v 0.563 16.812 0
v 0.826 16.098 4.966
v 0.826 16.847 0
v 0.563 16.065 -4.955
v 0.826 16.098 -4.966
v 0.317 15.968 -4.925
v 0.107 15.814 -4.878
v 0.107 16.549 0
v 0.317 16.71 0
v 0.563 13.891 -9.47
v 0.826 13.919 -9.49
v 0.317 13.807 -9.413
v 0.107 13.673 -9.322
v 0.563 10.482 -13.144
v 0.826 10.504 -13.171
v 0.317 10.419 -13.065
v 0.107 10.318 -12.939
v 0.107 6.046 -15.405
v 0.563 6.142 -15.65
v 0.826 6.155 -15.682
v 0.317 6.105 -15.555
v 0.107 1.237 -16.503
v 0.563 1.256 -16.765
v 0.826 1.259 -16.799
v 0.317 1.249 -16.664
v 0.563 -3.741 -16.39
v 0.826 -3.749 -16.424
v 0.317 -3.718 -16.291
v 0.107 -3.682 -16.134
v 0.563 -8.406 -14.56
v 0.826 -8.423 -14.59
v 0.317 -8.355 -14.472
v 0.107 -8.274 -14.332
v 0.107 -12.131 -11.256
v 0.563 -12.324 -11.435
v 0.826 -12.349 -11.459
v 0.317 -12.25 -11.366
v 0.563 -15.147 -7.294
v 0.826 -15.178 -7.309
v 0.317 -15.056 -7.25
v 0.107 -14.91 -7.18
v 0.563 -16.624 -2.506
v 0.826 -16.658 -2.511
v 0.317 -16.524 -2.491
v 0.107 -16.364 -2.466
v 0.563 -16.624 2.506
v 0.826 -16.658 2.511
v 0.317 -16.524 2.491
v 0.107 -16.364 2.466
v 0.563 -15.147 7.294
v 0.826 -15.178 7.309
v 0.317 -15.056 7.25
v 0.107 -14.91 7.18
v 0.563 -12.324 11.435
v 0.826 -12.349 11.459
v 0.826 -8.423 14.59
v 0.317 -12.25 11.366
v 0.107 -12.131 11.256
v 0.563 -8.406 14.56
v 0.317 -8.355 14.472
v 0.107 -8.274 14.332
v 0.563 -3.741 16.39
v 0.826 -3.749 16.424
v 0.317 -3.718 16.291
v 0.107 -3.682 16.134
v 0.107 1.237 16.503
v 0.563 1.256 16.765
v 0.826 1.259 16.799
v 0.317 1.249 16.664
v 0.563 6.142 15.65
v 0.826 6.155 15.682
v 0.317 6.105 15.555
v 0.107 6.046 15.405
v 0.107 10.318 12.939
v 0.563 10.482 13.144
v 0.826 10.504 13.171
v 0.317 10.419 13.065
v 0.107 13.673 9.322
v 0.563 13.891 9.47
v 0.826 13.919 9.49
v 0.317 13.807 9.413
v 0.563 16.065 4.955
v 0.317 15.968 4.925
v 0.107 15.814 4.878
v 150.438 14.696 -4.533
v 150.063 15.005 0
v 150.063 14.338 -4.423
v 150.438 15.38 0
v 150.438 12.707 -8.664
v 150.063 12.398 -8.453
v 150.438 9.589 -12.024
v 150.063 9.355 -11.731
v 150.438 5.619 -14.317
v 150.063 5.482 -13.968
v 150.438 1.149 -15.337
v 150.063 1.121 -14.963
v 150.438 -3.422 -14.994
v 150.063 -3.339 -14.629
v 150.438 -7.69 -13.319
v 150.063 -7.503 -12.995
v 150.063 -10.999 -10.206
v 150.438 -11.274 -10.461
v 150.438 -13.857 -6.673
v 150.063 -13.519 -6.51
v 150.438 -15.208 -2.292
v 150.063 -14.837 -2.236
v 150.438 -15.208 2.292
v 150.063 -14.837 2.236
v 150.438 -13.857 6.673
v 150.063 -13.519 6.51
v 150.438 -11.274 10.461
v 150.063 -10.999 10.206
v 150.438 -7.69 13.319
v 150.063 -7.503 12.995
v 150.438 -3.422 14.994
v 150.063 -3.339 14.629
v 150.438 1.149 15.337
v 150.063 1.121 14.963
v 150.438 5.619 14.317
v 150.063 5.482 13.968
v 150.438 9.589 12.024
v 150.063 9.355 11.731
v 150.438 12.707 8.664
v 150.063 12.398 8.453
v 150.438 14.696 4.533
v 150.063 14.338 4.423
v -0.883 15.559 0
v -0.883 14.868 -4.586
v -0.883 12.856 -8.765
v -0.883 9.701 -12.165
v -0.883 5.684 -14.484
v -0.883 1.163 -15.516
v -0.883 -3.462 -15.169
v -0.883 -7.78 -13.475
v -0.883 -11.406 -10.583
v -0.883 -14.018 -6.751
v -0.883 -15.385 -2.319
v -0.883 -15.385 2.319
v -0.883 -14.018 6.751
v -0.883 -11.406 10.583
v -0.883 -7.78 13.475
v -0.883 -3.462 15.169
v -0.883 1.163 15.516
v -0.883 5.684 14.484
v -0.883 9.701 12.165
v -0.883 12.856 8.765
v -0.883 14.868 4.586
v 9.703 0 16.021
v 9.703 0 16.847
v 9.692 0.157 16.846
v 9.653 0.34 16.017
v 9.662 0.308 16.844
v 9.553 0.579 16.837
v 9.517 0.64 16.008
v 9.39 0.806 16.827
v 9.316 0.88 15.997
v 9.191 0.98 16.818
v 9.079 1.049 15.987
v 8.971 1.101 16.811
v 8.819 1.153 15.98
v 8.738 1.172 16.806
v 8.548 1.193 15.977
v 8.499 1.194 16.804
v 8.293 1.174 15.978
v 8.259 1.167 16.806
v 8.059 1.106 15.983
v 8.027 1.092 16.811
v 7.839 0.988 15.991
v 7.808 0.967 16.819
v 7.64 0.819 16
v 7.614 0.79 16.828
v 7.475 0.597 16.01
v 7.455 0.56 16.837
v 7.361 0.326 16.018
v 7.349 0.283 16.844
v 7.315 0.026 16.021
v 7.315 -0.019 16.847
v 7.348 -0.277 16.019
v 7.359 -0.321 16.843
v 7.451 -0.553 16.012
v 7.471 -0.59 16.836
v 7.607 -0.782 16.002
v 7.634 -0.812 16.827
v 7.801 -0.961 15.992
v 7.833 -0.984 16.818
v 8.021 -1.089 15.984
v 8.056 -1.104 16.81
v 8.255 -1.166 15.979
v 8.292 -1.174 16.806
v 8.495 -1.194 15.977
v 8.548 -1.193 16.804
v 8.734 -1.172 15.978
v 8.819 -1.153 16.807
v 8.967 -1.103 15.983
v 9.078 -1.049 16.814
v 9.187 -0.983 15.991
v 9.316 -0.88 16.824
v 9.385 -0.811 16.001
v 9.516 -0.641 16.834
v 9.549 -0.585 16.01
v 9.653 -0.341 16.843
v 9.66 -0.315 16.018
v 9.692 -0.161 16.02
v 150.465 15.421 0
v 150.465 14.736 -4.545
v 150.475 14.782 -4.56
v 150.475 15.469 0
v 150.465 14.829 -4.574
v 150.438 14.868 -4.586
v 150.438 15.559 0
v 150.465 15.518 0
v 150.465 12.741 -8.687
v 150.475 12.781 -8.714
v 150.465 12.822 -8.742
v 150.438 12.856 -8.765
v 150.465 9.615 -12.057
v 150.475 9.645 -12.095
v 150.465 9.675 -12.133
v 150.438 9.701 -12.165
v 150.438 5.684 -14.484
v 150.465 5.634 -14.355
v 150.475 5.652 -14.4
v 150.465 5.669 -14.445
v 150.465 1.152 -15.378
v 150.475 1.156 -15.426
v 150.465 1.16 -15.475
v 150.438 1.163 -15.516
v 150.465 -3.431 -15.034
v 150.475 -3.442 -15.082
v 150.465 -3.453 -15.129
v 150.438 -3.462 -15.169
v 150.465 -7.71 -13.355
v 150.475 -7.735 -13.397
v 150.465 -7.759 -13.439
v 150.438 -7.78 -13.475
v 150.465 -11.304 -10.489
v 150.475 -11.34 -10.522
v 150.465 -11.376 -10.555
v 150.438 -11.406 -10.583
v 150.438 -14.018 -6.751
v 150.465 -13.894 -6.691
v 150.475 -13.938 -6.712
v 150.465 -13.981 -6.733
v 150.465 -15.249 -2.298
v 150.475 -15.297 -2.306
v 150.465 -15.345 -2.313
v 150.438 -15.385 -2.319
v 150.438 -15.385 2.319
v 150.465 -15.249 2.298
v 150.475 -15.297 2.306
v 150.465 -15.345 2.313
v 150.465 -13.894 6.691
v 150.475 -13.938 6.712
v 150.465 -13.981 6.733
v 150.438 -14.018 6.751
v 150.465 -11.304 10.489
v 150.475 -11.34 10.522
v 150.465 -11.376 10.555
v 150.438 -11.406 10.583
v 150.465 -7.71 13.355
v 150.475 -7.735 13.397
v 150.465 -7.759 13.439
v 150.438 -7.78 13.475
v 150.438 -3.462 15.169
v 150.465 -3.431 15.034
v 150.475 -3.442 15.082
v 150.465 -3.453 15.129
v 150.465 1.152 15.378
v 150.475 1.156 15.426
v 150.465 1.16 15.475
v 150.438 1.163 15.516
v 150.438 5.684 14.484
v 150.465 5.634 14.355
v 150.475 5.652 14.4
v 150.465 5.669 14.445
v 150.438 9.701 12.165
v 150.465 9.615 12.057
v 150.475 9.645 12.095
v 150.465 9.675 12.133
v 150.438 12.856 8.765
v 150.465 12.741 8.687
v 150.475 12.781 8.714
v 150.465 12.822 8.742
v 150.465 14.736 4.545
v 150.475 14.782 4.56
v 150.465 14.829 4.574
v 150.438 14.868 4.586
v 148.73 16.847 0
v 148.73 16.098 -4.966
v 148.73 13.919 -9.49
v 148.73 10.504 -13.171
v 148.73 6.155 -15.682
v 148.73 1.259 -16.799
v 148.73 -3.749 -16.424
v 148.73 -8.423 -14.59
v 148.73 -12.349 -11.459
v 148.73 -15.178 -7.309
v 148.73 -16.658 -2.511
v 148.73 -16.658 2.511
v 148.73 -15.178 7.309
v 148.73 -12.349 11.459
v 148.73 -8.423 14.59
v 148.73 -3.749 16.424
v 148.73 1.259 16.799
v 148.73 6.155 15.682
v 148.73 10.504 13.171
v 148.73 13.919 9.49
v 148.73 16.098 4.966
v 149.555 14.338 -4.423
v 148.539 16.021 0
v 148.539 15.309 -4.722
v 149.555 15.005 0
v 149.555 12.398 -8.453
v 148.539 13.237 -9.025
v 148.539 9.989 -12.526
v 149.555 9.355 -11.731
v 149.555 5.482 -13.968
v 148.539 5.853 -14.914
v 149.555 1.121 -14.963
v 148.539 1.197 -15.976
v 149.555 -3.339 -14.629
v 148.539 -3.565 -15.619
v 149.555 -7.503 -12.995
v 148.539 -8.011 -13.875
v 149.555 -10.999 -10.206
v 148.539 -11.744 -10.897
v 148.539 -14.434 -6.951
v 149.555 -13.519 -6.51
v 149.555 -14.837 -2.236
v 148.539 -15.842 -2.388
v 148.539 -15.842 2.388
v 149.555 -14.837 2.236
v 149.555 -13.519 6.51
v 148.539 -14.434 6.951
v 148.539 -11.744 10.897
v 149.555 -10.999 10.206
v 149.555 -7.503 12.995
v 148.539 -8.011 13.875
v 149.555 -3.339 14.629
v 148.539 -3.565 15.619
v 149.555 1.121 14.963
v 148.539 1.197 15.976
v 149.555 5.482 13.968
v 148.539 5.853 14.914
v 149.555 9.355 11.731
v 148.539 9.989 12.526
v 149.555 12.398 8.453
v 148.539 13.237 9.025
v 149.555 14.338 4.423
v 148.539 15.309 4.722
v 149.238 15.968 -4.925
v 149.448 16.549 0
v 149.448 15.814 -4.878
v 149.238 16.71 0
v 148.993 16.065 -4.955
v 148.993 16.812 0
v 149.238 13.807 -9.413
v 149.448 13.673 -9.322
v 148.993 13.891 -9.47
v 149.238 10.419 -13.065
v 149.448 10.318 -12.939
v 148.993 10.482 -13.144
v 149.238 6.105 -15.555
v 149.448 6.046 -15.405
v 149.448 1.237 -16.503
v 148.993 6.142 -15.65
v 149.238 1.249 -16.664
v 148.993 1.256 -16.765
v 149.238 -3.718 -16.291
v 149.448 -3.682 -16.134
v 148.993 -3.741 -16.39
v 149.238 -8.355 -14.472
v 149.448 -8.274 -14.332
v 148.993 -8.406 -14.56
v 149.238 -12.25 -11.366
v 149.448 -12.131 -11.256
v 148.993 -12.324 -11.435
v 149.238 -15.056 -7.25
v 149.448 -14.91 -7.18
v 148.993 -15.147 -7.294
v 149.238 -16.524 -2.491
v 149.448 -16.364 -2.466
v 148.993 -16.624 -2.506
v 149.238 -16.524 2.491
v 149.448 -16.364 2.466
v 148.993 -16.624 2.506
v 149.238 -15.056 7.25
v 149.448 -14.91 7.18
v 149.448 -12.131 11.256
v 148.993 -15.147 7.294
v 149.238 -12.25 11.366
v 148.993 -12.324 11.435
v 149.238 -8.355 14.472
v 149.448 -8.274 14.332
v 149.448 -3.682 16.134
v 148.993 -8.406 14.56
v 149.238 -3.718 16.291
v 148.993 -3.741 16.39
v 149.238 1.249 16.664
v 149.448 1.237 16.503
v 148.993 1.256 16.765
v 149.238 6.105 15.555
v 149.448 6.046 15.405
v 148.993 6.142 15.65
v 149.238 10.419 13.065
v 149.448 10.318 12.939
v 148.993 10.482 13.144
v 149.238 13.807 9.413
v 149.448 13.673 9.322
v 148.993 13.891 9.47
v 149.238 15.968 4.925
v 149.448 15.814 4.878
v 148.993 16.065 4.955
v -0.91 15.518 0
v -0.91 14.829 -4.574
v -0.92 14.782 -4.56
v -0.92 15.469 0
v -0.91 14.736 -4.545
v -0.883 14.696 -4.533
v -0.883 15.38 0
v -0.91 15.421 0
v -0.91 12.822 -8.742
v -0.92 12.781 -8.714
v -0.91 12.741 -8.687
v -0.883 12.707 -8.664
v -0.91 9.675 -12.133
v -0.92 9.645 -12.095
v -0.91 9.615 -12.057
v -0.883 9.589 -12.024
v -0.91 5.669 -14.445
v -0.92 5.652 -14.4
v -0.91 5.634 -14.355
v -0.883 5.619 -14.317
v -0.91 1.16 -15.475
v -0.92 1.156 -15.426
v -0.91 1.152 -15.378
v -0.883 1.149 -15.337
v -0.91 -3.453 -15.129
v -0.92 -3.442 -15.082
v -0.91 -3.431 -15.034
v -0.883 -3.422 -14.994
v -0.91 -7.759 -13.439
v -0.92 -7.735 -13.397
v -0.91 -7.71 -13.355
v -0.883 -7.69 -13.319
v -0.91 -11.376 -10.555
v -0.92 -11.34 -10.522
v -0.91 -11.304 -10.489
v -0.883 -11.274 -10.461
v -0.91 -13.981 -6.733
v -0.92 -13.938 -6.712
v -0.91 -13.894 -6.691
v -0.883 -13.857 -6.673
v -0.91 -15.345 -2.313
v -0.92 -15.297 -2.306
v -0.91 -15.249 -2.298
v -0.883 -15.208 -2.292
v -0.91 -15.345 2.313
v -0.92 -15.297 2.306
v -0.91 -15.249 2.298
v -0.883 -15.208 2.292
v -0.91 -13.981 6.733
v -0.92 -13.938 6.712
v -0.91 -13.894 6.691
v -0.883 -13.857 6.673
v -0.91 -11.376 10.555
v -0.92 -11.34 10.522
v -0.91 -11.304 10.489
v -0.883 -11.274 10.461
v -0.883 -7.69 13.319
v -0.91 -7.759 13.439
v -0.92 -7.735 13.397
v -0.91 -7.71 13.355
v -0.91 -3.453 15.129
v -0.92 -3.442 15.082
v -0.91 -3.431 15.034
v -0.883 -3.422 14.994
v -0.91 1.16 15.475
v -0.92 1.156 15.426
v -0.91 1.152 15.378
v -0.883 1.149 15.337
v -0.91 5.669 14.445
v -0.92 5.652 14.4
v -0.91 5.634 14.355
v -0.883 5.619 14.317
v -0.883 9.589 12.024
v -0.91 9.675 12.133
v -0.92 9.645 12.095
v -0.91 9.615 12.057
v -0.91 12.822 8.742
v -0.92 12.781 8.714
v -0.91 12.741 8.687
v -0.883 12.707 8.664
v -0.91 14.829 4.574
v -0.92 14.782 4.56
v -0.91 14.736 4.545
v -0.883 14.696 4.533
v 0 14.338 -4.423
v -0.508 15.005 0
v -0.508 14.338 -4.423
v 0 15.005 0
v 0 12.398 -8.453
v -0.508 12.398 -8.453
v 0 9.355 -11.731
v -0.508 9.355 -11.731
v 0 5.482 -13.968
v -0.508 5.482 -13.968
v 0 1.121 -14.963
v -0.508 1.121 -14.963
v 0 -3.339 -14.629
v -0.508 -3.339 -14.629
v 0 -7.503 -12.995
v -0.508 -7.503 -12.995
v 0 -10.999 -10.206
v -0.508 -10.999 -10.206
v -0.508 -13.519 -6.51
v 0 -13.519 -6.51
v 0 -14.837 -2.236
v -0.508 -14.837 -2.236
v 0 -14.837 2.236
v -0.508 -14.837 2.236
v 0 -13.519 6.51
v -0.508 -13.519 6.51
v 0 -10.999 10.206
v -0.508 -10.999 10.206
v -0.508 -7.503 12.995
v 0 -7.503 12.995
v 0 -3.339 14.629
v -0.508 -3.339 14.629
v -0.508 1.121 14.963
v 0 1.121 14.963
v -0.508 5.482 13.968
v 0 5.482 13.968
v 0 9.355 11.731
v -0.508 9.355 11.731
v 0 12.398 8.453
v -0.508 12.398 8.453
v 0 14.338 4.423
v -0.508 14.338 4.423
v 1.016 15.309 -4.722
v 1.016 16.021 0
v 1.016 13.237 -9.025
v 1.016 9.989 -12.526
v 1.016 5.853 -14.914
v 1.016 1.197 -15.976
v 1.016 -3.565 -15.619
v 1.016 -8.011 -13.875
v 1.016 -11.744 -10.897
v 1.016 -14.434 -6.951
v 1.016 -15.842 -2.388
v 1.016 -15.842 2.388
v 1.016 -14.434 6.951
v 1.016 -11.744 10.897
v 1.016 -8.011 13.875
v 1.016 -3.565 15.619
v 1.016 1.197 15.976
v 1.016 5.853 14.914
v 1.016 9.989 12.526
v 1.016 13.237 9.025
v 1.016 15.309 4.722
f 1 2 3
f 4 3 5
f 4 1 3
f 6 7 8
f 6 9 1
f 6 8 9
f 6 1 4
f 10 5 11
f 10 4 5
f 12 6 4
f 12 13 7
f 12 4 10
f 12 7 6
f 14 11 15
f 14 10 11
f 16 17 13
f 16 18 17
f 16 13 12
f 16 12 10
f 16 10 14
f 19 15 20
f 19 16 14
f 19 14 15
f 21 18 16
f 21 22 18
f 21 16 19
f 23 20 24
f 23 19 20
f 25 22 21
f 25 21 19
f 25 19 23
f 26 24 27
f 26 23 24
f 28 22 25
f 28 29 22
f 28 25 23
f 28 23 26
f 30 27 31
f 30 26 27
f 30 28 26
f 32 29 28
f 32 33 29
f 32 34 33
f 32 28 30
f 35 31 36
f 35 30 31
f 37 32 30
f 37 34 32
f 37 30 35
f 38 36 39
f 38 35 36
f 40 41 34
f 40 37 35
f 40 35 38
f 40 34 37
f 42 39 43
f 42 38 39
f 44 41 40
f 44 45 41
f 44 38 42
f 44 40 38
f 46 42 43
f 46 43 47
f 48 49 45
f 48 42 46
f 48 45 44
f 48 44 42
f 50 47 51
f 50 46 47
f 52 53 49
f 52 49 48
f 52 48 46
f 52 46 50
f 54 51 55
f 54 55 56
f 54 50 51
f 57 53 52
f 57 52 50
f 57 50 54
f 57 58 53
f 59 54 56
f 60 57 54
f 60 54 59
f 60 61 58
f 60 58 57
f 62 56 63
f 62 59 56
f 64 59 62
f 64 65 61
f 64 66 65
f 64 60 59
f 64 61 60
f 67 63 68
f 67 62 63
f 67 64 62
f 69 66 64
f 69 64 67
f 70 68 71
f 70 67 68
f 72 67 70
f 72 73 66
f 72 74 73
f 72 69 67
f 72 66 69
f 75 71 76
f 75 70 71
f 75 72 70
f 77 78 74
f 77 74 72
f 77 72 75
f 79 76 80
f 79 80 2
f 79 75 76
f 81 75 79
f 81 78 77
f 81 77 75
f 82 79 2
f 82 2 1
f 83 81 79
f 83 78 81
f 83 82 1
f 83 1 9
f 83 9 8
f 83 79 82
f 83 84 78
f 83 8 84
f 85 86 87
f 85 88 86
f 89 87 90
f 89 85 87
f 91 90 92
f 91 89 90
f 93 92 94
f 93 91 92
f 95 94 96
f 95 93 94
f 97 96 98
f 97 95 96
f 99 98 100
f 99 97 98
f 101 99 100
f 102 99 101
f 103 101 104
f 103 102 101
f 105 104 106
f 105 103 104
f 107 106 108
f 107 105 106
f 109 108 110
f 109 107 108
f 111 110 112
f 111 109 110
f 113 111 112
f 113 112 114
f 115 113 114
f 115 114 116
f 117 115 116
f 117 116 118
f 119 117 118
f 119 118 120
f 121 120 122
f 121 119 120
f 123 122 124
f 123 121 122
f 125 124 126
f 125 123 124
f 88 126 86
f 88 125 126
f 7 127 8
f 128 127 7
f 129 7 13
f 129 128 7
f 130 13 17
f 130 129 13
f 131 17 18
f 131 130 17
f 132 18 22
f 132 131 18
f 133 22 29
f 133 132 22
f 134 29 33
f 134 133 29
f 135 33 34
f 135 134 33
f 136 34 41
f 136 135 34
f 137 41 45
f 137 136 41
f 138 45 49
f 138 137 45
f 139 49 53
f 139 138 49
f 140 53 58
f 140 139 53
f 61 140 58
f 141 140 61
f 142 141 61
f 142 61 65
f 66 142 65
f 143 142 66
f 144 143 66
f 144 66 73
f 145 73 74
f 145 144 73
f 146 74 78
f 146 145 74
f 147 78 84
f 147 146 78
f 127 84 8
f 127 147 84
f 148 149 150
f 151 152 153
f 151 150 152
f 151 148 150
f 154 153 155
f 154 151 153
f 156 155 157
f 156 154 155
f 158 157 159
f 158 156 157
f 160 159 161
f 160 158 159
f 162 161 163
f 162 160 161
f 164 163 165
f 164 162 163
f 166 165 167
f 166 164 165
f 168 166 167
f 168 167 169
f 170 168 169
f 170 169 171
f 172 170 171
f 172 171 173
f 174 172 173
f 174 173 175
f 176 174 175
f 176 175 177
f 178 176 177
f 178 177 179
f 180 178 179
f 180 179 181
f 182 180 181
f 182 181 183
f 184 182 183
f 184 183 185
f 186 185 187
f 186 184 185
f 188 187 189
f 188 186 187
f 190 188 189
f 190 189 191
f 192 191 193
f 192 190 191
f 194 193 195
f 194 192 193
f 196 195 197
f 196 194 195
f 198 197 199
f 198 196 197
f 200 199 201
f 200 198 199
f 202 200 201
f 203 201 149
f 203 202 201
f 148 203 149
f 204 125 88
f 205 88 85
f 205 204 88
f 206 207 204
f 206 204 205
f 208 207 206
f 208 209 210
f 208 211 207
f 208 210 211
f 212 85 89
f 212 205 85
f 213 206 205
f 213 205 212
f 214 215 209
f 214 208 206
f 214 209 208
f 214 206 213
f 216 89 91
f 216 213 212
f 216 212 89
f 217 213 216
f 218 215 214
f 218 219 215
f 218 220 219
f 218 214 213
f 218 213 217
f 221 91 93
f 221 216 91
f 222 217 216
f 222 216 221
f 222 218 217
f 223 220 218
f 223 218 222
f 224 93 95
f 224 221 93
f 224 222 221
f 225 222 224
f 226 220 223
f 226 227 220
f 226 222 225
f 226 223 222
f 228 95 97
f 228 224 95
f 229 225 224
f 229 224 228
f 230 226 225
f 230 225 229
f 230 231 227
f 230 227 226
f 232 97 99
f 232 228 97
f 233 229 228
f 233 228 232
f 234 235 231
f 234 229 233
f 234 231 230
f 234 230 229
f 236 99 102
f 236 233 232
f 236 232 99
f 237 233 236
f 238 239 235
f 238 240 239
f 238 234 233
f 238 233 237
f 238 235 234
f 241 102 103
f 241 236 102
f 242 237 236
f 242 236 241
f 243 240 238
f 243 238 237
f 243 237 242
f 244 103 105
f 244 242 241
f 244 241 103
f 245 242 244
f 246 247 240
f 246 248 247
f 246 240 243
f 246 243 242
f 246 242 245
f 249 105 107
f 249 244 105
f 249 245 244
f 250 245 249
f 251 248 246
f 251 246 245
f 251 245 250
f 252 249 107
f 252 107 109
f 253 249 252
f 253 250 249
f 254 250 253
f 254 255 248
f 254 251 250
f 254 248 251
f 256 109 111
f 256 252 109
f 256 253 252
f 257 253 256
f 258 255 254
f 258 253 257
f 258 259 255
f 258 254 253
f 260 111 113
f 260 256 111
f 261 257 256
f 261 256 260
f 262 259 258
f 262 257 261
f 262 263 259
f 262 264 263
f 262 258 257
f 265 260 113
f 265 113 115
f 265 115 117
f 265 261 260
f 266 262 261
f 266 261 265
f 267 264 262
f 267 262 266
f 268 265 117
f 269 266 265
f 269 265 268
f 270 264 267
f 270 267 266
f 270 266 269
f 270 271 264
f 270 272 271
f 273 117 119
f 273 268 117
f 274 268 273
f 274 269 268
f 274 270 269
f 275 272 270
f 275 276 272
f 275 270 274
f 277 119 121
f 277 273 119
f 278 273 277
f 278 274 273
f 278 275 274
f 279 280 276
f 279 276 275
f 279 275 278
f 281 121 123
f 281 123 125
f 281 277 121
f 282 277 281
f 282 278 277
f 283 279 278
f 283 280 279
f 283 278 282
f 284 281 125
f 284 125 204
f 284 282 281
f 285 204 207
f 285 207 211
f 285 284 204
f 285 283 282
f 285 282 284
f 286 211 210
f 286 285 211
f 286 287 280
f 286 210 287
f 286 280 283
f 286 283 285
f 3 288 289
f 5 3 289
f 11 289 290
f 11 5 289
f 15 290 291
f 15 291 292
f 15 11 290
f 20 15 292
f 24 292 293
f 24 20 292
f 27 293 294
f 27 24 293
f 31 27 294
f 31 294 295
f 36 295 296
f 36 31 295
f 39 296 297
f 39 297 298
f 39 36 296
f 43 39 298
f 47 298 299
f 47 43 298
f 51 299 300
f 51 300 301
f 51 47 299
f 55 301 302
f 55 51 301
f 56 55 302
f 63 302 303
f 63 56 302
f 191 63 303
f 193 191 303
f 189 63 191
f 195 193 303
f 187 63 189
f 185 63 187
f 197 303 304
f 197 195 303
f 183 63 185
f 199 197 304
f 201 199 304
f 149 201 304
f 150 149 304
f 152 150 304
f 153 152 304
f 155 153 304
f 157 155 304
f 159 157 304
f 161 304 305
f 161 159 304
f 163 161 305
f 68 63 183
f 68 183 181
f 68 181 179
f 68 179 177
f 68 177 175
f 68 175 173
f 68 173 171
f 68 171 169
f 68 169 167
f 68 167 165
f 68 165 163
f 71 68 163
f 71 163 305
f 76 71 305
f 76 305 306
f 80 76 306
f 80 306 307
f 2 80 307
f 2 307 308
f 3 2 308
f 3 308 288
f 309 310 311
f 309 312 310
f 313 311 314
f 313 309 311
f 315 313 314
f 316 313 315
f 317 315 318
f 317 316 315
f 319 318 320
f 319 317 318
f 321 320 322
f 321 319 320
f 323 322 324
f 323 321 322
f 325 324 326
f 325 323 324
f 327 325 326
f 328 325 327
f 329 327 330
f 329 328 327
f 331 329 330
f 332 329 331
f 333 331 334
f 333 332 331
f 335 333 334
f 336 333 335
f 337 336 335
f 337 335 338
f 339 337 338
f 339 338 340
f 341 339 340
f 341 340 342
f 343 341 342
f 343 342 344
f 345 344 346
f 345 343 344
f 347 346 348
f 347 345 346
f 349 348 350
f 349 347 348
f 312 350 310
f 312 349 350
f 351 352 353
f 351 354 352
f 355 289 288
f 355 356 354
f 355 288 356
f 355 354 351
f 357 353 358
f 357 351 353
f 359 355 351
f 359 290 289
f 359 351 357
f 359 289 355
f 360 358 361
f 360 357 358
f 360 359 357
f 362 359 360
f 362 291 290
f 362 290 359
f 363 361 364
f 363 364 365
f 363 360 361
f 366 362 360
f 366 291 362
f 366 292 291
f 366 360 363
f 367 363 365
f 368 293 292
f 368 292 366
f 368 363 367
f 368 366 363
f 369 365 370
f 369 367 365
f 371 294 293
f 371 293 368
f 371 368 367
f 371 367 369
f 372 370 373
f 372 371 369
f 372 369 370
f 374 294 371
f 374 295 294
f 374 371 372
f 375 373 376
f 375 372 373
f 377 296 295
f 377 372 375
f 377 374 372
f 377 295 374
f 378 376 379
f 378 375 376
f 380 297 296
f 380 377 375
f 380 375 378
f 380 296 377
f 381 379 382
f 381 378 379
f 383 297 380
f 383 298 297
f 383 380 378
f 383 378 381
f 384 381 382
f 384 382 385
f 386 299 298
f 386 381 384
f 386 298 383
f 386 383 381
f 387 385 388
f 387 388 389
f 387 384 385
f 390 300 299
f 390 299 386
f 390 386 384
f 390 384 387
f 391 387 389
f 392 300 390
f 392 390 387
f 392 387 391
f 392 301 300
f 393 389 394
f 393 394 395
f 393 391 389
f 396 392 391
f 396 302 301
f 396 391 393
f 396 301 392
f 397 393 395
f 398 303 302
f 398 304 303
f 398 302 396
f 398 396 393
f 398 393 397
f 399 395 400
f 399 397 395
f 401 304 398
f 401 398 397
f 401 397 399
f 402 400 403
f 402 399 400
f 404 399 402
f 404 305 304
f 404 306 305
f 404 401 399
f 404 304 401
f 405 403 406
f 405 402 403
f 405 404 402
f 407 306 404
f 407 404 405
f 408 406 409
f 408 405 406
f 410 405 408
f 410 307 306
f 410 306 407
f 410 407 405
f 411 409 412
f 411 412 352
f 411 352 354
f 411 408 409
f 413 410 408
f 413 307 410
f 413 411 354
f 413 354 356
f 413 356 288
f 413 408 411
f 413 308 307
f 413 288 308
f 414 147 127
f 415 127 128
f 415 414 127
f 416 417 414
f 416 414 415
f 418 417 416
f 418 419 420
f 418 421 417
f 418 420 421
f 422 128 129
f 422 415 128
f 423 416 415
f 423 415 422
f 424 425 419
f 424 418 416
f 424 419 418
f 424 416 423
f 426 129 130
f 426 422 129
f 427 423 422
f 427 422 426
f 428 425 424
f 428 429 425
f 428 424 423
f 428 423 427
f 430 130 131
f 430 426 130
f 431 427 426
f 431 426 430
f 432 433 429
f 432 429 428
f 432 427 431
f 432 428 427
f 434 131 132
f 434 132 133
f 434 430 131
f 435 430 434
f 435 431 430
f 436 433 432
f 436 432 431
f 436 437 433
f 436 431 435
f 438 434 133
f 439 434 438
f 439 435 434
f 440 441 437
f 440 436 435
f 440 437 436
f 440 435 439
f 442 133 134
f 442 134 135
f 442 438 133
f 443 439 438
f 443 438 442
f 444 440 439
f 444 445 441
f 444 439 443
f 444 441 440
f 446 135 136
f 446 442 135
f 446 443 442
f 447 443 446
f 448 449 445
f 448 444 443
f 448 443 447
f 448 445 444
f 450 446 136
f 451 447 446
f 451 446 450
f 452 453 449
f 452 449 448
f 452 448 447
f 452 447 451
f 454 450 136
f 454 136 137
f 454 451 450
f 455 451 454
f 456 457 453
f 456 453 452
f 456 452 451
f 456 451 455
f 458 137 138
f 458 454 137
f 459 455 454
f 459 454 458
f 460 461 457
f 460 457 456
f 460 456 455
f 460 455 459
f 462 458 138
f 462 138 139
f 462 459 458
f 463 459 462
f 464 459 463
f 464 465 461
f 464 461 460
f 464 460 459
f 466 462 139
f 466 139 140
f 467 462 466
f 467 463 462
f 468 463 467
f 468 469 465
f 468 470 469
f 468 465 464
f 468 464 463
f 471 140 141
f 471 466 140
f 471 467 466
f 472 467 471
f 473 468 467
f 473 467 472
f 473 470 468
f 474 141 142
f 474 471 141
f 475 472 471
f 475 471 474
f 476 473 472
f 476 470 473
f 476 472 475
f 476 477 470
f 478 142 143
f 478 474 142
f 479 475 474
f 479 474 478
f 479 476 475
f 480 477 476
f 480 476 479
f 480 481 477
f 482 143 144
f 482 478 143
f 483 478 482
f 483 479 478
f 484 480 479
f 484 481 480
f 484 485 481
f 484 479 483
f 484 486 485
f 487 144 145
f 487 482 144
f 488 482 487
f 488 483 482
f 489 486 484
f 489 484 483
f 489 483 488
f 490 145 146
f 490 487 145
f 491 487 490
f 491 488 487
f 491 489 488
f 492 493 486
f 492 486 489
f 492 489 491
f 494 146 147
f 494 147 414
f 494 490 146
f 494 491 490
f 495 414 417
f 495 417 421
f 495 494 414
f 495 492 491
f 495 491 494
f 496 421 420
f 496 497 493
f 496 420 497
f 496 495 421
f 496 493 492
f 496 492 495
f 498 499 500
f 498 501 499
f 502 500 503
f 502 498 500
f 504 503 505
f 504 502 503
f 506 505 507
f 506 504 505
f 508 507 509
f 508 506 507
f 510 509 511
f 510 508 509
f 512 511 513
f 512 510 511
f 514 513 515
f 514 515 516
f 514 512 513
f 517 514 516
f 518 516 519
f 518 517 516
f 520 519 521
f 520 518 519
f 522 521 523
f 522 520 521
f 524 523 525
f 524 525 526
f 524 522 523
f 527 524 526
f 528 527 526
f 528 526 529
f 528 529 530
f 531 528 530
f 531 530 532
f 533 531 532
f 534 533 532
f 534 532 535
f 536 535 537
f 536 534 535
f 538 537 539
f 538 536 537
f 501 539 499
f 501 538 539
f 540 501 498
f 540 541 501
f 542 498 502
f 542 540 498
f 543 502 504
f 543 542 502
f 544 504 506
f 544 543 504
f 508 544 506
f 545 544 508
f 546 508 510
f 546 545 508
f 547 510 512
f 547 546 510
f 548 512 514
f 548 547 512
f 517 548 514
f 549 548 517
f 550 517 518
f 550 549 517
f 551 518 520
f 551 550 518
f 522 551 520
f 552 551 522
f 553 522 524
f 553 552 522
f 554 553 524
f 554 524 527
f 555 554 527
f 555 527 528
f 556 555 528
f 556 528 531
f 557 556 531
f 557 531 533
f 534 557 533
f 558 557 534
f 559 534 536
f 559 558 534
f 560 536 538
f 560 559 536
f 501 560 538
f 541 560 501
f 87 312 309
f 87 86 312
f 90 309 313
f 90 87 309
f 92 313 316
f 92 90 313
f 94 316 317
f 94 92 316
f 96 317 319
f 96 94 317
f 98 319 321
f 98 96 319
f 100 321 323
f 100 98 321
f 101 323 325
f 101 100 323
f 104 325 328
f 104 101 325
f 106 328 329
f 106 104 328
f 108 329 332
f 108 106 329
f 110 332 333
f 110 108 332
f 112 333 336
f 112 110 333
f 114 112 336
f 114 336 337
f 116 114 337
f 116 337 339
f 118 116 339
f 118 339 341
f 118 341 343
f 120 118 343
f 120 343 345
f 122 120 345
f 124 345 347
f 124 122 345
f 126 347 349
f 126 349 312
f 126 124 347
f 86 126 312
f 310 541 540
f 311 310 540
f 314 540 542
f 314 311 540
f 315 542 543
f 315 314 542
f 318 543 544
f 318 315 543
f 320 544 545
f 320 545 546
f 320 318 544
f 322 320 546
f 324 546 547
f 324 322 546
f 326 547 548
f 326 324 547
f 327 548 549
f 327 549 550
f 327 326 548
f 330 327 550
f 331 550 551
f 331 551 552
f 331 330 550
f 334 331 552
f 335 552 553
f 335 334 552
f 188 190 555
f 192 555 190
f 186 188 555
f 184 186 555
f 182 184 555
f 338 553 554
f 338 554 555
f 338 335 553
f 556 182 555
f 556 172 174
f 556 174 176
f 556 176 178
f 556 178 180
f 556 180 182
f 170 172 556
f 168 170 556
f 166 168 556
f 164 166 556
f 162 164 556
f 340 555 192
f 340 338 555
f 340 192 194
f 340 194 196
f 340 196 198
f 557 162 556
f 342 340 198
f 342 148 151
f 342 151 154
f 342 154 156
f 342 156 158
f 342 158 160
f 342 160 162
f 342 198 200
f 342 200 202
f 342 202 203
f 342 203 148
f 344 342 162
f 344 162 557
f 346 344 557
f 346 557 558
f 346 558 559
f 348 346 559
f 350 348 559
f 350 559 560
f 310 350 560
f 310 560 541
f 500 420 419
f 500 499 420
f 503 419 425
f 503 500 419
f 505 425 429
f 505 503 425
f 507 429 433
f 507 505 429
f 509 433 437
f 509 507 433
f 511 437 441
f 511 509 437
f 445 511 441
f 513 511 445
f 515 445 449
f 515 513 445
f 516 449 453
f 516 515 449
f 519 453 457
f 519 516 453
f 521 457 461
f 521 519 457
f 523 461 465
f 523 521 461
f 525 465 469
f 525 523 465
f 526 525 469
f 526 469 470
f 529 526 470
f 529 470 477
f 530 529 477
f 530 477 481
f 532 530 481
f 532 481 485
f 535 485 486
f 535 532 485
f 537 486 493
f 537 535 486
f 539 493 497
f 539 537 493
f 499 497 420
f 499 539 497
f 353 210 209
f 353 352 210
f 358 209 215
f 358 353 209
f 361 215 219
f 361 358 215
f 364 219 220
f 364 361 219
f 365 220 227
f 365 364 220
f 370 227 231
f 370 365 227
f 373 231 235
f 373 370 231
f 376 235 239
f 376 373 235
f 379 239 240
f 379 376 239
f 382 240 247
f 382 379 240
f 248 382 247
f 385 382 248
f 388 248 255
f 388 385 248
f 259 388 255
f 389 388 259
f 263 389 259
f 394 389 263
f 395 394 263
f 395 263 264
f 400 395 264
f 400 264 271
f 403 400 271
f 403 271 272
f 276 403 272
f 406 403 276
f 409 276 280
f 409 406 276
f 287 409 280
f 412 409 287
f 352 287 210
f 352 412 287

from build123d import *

# Parameters (mm, degrees)
SKETCH2_R          = 1.1938
CUT_EXTRUDE1_DEPTH = 16.84655


with BuildPart() as part:
    # Sketch1 → Revolve1 (revolve)
    with BuildSketch(Plane.XY):
        with BuildLine():
            Line((-0.882617928, 15.379667928), (-0.508, 15.00505))
            Line((-0.508, 15.00505), (0, 15.00505))
            Line((0, 15.00505), (1.016, 16.02105))
            Line((1.016, 16.02105), (148.5392, 16.02105))
            Line((148.5392, 16.02105), (149.5552, 15.00505))
            Line((149.5552, 15.00505), (150.0632, 15.00505))
            Line((150.0632, 15.00505), (150.437817928, 15.379667928))
            ThreePointArc((150.437817928, 15.379667928), (150.475015367, 15.46947049), (150.437817928, 15.559273051))
            Line((150.437817928, 15.559273051), (149.44812049, 16.54897049))
            ThreePointArc((149.44812049, 16.54897049), (149.118506367, 16.769211605), (148.7297, 16.84655))
            Line((148.7297, 16.84655), (0.8255, 16.84655))
            ThreePointArc((0.8255, 16.84655), (0.436693633, 16.769211605), (0.10707951, 16.54897049))
            Line((0.10707951, 16.54897049), (-0.882617928, 15.559273051))
            ThreePointArc((-0.882617928, 15.559273051), (-0.919815367, 15.46947049), (-0.882617928, 15.379667928))
        make_face()
    revolve(axis=Axis((149.5552, 0, 0), (-1, 0, 0)))

    # Sketch2 → Cut-Extrude1 (cut)
    with BuildSketch(Plane.XY):
        with Locations((8.509, 0)):
            Circle(SKETCH2_R)
    extrude(amount=CUT_EXTRUDE1_DEPTH, mode=Mode.SUBTRACT)


solid = part.part
